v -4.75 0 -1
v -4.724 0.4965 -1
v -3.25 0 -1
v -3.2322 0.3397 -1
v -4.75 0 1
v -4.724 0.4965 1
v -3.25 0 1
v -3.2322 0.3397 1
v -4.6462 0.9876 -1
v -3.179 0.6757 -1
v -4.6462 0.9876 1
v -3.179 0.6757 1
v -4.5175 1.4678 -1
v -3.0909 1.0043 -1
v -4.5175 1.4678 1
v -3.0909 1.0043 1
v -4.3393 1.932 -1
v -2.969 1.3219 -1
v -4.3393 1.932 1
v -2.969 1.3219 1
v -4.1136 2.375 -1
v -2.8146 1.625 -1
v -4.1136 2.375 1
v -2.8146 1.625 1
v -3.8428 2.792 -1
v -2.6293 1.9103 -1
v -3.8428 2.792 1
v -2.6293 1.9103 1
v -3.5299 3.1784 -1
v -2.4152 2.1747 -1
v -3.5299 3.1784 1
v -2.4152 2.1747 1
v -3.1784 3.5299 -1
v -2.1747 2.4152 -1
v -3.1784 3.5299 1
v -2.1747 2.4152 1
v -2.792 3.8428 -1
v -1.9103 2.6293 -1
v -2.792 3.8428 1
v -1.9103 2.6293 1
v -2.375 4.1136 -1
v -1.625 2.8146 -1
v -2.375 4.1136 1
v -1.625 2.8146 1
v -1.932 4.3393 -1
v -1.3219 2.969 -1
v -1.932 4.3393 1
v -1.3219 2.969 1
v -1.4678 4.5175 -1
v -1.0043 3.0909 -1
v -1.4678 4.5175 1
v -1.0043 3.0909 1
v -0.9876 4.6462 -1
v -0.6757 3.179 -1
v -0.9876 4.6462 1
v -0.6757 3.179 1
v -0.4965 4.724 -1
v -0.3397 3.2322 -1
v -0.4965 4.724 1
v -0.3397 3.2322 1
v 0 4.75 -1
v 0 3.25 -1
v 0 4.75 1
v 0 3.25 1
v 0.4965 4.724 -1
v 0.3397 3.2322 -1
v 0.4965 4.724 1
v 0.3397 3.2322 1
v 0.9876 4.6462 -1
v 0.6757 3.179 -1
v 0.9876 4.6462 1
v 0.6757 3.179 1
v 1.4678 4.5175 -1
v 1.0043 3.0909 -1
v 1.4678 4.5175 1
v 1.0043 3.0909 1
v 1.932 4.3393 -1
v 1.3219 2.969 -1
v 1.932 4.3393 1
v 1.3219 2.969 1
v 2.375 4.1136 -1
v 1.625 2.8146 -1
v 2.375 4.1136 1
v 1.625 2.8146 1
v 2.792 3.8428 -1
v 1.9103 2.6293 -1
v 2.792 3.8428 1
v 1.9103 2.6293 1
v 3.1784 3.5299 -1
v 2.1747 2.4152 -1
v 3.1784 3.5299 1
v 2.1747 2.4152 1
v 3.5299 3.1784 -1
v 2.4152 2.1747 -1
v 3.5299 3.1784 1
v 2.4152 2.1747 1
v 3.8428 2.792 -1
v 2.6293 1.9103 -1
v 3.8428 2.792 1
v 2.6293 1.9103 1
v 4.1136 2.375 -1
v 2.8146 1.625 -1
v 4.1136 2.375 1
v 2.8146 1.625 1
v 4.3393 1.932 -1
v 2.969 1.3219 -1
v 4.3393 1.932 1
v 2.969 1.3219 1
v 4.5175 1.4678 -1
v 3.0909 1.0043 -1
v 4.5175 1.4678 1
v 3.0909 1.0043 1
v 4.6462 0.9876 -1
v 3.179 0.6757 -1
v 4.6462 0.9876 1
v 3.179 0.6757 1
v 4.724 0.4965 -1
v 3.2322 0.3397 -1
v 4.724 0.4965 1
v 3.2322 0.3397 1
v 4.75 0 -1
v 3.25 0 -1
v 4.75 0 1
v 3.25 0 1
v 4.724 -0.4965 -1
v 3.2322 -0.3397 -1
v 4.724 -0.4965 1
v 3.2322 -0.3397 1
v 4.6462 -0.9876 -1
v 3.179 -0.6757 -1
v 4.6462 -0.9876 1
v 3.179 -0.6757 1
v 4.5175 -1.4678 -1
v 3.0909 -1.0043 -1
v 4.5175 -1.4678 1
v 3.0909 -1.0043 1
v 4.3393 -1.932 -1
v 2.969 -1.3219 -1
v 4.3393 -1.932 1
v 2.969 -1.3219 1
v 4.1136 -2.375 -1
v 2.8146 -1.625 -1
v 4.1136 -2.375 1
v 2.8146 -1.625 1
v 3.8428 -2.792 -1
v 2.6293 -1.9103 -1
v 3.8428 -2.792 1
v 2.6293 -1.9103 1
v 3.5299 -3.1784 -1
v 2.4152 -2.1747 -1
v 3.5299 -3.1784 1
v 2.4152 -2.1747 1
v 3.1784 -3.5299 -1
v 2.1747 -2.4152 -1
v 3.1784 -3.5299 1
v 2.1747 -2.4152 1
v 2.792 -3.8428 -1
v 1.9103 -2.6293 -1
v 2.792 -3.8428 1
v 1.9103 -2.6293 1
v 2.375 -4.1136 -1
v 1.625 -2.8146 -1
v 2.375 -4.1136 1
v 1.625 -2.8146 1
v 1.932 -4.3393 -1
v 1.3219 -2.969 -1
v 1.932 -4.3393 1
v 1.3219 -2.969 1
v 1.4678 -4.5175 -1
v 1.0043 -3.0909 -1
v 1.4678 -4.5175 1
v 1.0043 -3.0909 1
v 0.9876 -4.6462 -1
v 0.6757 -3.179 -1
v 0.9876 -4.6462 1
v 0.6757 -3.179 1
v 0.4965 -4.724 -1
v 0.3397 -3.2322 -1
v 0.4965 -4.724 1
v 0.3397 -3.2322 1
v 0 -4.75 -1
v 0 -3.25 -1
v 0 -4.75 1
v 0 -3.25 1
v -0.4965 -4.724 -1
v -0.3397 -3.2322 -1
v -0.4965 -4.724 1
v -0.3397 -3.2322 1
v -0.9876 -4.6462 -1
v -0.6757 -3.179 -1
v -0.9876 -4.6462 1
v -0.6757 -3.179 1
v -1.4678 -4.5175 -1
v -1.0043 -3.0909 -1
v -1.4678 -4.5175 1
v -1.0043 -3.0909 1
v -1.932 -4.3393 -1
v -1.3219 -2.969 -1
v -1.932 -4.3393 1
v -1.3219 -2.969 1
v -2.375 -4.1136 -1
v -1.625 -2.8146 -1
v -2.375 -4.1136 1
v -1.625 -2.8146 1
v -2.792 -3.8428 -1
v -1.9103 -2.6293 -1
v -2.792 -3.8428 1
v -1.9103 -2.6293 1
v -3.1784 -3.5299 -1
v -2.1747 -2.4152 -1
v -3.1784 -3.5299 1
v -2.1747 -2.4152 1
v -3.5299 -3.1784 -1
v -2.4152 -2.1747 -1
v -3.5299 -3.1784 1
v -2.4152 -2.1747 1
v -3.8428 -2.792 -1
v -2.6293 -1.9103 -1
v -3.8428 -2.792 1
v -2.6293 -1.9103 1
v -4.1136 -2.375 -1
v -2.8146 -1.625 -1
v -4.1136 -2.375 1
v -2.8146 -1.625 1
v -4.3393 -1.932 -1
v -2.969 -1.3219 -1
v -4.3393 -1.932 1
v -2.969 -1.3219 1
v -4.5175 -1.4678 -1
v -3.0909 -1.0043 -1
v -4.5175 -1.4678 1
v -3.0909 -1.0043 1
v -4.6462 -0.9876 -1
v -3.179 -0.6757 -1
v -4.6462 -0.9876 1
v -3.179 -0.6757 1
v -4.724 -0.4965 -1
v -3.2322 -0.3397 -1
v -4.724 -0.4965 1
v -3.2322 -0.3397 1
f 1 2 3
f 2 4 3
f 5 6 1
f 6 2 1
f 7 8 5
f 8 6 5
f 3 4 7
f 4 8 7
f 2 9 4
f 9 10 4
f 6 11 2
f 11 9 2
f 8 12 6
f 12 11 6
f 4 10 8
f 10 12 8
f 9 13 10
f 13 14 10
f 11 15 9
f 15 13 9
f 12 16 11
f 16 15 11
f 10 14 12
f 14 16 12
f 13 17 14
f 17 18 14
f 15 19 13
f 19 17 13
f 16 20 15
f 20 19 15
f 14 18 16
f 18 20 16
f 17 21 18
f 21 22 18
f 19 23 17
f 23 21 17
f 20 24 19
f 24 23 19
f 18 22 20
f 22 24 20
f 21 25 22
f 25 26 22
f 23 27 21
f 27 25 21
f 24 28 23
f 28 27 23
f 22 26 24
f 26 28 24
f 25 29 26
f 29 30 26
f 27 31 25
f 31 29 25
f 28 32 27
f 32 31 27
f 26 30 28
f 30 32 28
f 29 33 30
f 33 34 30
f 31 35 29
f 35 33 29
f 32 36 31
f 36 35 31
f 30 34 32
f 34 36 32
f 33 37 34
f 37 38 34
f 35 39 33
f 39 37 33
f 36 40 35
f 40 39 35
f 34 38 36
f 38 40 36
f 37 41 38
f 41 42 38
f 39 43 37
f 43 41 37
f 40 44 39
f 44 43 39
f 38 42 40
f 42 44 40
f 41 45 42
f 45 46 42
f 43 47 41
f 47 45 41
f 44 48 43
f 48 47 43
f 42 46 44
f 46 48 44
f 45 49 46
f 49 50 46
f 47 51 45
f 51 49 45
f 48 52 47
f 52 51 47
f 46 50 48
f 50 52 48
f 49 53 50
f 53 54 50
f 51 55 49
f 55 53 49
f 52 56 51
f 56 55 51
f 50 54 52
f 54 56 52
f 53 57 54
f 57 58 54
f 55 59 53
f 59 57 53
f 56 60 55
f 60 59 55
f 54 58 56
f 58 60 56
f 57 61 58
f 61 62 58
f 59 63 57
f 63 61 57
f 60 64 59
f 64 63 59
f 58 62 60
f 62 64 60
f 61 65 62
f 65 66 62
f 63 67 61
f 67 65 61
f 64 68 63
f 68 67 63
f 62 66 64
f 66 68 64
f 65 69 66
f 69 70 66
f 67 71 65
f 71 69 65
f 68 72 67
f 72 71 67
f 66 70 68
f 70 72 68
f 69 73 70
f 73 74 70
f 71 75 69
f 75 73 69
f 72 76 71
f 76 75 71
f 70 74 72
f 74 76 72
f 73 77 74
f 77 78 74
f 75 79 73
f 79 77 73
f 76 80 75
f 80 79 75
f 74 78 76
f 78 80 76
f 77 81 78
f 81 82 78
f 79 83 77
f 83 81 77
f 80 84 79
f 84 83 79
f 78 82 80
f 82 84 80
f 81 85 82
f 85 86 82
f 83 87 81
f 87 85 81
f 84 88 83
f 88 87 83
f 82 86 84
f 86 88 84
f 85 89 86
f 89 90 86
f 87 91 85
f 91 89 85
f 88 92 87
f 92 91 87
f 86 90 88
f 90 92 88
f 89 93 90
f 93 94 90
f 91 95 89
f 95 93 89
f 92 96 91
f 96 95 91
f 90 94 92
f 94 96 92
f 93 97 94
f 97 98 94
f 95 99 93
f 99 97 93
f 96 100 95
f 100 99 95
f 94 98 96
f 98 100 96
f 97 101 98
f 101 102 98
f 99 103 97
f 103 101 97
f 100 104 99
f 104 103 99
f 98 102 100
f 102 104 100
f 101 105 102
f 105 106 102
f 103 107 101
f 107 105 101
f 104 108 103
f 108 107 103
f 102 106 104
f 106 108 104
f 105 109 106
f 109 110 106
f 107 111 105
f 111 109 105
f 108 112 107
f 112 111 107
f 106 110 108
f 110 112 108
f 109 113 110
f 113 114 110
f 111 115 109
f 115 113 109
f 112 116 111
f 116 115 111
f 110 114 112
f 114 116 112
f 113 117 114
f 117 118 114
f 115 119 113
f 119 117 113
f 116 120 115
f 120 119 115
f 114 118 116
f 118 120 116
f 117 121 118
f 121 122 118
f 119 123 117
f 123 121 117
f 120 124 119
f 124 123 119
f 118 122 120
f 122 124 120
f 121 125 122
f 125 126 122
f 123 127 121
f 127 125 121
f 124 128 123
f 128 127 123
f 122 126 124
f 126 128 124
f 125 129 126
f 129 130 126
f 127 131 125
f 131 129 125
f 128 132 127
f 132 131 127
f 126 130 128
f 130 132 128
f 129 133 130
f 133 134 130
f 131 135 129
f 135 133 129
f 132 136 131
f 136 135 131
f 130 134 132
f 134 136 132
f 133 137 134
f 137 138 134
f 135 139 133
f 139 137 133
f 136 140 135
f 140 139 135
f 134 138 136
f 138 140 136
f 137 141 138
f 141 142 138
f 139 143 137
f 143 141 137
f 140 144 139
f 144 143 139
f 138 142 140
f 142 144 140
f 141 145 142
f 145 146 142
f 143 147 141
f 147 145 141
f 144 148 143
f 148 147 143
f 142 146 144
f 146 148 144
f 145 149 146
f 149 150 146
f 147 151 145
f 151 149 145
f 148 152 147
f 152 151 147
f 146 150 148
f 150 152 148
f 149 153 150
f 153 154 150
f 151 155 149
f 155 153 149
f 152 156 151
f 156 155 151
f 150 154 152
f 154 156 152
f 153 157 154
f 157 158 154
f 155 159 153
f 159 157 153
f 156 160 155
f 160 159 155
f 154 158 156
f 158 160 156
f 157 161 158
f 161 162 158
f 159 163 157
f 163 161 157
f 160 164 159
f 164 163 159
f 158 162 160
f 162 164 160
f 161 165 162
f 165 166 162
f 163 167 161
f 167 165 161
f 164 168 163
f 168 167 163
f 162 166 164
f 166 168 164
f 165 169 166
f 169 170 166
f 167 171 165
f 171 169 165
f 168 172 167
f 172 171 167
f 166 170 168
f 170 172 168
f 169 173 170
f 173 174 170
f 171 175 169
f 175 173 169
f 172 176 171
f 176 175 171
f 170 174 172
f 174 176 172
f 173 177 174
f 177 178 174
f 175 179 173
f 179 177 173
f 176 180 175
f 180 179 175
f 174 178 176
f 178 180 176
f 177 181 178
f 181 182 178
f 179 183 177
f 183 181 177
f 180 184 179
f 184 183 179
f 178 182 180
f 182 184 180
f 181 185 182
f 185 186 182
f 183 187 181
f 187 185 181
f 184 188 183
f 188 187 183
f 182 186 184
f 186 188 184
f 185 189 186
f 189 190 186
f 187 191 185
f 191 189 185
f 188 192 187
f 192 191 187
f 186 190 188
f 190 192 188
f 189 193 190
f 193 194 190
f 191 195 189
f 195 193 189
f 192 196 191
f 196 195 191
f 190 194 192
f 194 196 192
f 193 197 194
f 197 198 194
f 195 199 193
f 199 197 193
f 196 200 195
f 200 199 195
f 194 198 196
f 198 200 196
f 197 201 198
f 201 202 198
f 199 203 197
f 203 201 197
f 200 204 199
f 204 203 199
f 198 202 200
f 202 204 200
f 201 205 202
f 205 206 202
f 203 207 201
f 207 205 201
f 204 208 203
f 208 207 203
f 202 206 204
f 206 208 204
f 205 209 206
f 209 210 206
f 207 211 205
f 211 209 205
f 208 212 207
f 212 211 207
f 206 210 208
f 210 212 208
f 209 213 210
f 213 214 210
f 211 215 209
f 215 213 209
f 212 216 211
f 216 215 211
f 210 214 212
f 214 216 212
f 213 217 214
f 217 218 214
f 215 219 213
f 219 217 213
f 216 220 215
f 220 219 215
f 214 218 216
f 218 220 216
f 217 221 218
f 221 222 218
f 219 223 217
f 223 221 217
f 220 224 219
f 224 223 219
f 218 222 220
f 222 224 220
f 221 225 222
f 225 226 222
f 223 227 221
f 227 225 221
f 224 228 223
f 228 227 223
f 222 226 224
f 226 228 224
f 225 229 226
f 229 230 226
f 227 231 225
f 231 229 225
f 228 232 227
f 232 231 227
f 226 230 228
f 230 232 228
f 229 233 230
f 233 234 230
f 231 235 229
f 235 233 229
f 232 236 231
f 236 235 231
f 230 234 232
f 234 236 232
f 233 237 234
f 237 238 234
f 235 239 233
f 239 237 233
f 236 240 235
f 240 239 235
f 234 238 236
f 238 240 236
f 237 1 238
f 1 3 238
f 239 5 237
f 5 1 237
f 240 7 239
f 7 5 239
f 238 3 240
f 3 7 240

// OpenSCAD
profile_width = 1.5;
profile_height = 2.0;
radius = 4.0;
detail = 60;
$fn = detail;

rotate_extrude()
    translate([radius, 0, 0])
        square([profile_width, profile_height], center = true);
